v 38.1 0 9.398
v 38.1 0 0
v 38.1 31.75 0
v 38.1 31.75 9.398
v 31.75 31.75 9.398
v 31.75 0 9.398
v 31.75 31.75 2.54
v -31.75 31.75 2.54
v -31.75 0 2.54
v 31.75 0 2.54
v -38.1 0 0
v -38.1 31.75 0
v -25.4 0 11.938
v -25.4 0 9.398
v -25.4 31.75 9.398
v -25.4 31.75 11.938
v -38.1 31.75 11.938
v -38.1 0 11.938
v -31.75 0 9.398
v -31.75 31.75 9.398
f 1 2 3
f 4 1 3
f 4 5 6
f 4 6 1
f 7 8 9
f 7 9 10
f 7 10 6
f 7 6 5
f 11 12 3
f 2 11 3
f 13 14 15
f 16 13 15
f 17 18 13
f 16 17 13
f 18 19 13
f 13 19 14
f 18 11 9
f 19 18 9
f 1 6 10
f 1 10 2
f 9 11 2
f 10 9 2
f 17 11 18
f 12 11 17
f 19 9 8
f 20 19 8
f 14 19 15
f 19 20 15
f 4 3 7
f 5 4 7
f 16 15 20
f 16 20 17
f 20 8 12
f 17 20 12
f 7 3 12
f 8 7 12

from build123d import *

# Parameters (mm, degrees)
F0_W     = 6.35
F0_H     = 31.75
F0_W_2   = 63.5
F1_DEPTH = 2.54
F2_DEPTH = 9.398
F3_W     = 6.35
F3_H     = 31.75
F4_DEPTH = 2.54


with BuildPart() as f1:
    # F0 (on Top) → F1 (new body)
    with BuildSketch(Plane.XY):
        with Locations((-34.925, 15.875)):
            Rectangle(F0_W, F0_H)
        with Locations((0, 15.875)):
            Rectangle(F0_W_2, F0_H)
        with Locations((34.925, 15.875)):
            Rectangle(F0_W, F0_H)
    extrude(amount=F1_DEPTH)

    # F0 (on Top) → F2 (join)
    with BuildSketch(Plane.XY):
        with Locations((-34.925, 15.875)):
            Rectangle(F0_W, F0_H)
        with Locations((34.925, 15.875)):
            Rectangle(F0_W, F0_H)
    extrude(amount=F2_DEPTH)

    # F3 (on face) → F4 (join)
    with BuildSketch(Plane.XY.offset(9.398)):
        with Locations((-28.575, 15.875)):
            Rectangle(F3_W, F3_H)
        with Locations((-34.925, 15.875)):
            Rectangle(F3_W, F3_H)
    extrude(amount=F4_DEPTH)


solid = f1.part
